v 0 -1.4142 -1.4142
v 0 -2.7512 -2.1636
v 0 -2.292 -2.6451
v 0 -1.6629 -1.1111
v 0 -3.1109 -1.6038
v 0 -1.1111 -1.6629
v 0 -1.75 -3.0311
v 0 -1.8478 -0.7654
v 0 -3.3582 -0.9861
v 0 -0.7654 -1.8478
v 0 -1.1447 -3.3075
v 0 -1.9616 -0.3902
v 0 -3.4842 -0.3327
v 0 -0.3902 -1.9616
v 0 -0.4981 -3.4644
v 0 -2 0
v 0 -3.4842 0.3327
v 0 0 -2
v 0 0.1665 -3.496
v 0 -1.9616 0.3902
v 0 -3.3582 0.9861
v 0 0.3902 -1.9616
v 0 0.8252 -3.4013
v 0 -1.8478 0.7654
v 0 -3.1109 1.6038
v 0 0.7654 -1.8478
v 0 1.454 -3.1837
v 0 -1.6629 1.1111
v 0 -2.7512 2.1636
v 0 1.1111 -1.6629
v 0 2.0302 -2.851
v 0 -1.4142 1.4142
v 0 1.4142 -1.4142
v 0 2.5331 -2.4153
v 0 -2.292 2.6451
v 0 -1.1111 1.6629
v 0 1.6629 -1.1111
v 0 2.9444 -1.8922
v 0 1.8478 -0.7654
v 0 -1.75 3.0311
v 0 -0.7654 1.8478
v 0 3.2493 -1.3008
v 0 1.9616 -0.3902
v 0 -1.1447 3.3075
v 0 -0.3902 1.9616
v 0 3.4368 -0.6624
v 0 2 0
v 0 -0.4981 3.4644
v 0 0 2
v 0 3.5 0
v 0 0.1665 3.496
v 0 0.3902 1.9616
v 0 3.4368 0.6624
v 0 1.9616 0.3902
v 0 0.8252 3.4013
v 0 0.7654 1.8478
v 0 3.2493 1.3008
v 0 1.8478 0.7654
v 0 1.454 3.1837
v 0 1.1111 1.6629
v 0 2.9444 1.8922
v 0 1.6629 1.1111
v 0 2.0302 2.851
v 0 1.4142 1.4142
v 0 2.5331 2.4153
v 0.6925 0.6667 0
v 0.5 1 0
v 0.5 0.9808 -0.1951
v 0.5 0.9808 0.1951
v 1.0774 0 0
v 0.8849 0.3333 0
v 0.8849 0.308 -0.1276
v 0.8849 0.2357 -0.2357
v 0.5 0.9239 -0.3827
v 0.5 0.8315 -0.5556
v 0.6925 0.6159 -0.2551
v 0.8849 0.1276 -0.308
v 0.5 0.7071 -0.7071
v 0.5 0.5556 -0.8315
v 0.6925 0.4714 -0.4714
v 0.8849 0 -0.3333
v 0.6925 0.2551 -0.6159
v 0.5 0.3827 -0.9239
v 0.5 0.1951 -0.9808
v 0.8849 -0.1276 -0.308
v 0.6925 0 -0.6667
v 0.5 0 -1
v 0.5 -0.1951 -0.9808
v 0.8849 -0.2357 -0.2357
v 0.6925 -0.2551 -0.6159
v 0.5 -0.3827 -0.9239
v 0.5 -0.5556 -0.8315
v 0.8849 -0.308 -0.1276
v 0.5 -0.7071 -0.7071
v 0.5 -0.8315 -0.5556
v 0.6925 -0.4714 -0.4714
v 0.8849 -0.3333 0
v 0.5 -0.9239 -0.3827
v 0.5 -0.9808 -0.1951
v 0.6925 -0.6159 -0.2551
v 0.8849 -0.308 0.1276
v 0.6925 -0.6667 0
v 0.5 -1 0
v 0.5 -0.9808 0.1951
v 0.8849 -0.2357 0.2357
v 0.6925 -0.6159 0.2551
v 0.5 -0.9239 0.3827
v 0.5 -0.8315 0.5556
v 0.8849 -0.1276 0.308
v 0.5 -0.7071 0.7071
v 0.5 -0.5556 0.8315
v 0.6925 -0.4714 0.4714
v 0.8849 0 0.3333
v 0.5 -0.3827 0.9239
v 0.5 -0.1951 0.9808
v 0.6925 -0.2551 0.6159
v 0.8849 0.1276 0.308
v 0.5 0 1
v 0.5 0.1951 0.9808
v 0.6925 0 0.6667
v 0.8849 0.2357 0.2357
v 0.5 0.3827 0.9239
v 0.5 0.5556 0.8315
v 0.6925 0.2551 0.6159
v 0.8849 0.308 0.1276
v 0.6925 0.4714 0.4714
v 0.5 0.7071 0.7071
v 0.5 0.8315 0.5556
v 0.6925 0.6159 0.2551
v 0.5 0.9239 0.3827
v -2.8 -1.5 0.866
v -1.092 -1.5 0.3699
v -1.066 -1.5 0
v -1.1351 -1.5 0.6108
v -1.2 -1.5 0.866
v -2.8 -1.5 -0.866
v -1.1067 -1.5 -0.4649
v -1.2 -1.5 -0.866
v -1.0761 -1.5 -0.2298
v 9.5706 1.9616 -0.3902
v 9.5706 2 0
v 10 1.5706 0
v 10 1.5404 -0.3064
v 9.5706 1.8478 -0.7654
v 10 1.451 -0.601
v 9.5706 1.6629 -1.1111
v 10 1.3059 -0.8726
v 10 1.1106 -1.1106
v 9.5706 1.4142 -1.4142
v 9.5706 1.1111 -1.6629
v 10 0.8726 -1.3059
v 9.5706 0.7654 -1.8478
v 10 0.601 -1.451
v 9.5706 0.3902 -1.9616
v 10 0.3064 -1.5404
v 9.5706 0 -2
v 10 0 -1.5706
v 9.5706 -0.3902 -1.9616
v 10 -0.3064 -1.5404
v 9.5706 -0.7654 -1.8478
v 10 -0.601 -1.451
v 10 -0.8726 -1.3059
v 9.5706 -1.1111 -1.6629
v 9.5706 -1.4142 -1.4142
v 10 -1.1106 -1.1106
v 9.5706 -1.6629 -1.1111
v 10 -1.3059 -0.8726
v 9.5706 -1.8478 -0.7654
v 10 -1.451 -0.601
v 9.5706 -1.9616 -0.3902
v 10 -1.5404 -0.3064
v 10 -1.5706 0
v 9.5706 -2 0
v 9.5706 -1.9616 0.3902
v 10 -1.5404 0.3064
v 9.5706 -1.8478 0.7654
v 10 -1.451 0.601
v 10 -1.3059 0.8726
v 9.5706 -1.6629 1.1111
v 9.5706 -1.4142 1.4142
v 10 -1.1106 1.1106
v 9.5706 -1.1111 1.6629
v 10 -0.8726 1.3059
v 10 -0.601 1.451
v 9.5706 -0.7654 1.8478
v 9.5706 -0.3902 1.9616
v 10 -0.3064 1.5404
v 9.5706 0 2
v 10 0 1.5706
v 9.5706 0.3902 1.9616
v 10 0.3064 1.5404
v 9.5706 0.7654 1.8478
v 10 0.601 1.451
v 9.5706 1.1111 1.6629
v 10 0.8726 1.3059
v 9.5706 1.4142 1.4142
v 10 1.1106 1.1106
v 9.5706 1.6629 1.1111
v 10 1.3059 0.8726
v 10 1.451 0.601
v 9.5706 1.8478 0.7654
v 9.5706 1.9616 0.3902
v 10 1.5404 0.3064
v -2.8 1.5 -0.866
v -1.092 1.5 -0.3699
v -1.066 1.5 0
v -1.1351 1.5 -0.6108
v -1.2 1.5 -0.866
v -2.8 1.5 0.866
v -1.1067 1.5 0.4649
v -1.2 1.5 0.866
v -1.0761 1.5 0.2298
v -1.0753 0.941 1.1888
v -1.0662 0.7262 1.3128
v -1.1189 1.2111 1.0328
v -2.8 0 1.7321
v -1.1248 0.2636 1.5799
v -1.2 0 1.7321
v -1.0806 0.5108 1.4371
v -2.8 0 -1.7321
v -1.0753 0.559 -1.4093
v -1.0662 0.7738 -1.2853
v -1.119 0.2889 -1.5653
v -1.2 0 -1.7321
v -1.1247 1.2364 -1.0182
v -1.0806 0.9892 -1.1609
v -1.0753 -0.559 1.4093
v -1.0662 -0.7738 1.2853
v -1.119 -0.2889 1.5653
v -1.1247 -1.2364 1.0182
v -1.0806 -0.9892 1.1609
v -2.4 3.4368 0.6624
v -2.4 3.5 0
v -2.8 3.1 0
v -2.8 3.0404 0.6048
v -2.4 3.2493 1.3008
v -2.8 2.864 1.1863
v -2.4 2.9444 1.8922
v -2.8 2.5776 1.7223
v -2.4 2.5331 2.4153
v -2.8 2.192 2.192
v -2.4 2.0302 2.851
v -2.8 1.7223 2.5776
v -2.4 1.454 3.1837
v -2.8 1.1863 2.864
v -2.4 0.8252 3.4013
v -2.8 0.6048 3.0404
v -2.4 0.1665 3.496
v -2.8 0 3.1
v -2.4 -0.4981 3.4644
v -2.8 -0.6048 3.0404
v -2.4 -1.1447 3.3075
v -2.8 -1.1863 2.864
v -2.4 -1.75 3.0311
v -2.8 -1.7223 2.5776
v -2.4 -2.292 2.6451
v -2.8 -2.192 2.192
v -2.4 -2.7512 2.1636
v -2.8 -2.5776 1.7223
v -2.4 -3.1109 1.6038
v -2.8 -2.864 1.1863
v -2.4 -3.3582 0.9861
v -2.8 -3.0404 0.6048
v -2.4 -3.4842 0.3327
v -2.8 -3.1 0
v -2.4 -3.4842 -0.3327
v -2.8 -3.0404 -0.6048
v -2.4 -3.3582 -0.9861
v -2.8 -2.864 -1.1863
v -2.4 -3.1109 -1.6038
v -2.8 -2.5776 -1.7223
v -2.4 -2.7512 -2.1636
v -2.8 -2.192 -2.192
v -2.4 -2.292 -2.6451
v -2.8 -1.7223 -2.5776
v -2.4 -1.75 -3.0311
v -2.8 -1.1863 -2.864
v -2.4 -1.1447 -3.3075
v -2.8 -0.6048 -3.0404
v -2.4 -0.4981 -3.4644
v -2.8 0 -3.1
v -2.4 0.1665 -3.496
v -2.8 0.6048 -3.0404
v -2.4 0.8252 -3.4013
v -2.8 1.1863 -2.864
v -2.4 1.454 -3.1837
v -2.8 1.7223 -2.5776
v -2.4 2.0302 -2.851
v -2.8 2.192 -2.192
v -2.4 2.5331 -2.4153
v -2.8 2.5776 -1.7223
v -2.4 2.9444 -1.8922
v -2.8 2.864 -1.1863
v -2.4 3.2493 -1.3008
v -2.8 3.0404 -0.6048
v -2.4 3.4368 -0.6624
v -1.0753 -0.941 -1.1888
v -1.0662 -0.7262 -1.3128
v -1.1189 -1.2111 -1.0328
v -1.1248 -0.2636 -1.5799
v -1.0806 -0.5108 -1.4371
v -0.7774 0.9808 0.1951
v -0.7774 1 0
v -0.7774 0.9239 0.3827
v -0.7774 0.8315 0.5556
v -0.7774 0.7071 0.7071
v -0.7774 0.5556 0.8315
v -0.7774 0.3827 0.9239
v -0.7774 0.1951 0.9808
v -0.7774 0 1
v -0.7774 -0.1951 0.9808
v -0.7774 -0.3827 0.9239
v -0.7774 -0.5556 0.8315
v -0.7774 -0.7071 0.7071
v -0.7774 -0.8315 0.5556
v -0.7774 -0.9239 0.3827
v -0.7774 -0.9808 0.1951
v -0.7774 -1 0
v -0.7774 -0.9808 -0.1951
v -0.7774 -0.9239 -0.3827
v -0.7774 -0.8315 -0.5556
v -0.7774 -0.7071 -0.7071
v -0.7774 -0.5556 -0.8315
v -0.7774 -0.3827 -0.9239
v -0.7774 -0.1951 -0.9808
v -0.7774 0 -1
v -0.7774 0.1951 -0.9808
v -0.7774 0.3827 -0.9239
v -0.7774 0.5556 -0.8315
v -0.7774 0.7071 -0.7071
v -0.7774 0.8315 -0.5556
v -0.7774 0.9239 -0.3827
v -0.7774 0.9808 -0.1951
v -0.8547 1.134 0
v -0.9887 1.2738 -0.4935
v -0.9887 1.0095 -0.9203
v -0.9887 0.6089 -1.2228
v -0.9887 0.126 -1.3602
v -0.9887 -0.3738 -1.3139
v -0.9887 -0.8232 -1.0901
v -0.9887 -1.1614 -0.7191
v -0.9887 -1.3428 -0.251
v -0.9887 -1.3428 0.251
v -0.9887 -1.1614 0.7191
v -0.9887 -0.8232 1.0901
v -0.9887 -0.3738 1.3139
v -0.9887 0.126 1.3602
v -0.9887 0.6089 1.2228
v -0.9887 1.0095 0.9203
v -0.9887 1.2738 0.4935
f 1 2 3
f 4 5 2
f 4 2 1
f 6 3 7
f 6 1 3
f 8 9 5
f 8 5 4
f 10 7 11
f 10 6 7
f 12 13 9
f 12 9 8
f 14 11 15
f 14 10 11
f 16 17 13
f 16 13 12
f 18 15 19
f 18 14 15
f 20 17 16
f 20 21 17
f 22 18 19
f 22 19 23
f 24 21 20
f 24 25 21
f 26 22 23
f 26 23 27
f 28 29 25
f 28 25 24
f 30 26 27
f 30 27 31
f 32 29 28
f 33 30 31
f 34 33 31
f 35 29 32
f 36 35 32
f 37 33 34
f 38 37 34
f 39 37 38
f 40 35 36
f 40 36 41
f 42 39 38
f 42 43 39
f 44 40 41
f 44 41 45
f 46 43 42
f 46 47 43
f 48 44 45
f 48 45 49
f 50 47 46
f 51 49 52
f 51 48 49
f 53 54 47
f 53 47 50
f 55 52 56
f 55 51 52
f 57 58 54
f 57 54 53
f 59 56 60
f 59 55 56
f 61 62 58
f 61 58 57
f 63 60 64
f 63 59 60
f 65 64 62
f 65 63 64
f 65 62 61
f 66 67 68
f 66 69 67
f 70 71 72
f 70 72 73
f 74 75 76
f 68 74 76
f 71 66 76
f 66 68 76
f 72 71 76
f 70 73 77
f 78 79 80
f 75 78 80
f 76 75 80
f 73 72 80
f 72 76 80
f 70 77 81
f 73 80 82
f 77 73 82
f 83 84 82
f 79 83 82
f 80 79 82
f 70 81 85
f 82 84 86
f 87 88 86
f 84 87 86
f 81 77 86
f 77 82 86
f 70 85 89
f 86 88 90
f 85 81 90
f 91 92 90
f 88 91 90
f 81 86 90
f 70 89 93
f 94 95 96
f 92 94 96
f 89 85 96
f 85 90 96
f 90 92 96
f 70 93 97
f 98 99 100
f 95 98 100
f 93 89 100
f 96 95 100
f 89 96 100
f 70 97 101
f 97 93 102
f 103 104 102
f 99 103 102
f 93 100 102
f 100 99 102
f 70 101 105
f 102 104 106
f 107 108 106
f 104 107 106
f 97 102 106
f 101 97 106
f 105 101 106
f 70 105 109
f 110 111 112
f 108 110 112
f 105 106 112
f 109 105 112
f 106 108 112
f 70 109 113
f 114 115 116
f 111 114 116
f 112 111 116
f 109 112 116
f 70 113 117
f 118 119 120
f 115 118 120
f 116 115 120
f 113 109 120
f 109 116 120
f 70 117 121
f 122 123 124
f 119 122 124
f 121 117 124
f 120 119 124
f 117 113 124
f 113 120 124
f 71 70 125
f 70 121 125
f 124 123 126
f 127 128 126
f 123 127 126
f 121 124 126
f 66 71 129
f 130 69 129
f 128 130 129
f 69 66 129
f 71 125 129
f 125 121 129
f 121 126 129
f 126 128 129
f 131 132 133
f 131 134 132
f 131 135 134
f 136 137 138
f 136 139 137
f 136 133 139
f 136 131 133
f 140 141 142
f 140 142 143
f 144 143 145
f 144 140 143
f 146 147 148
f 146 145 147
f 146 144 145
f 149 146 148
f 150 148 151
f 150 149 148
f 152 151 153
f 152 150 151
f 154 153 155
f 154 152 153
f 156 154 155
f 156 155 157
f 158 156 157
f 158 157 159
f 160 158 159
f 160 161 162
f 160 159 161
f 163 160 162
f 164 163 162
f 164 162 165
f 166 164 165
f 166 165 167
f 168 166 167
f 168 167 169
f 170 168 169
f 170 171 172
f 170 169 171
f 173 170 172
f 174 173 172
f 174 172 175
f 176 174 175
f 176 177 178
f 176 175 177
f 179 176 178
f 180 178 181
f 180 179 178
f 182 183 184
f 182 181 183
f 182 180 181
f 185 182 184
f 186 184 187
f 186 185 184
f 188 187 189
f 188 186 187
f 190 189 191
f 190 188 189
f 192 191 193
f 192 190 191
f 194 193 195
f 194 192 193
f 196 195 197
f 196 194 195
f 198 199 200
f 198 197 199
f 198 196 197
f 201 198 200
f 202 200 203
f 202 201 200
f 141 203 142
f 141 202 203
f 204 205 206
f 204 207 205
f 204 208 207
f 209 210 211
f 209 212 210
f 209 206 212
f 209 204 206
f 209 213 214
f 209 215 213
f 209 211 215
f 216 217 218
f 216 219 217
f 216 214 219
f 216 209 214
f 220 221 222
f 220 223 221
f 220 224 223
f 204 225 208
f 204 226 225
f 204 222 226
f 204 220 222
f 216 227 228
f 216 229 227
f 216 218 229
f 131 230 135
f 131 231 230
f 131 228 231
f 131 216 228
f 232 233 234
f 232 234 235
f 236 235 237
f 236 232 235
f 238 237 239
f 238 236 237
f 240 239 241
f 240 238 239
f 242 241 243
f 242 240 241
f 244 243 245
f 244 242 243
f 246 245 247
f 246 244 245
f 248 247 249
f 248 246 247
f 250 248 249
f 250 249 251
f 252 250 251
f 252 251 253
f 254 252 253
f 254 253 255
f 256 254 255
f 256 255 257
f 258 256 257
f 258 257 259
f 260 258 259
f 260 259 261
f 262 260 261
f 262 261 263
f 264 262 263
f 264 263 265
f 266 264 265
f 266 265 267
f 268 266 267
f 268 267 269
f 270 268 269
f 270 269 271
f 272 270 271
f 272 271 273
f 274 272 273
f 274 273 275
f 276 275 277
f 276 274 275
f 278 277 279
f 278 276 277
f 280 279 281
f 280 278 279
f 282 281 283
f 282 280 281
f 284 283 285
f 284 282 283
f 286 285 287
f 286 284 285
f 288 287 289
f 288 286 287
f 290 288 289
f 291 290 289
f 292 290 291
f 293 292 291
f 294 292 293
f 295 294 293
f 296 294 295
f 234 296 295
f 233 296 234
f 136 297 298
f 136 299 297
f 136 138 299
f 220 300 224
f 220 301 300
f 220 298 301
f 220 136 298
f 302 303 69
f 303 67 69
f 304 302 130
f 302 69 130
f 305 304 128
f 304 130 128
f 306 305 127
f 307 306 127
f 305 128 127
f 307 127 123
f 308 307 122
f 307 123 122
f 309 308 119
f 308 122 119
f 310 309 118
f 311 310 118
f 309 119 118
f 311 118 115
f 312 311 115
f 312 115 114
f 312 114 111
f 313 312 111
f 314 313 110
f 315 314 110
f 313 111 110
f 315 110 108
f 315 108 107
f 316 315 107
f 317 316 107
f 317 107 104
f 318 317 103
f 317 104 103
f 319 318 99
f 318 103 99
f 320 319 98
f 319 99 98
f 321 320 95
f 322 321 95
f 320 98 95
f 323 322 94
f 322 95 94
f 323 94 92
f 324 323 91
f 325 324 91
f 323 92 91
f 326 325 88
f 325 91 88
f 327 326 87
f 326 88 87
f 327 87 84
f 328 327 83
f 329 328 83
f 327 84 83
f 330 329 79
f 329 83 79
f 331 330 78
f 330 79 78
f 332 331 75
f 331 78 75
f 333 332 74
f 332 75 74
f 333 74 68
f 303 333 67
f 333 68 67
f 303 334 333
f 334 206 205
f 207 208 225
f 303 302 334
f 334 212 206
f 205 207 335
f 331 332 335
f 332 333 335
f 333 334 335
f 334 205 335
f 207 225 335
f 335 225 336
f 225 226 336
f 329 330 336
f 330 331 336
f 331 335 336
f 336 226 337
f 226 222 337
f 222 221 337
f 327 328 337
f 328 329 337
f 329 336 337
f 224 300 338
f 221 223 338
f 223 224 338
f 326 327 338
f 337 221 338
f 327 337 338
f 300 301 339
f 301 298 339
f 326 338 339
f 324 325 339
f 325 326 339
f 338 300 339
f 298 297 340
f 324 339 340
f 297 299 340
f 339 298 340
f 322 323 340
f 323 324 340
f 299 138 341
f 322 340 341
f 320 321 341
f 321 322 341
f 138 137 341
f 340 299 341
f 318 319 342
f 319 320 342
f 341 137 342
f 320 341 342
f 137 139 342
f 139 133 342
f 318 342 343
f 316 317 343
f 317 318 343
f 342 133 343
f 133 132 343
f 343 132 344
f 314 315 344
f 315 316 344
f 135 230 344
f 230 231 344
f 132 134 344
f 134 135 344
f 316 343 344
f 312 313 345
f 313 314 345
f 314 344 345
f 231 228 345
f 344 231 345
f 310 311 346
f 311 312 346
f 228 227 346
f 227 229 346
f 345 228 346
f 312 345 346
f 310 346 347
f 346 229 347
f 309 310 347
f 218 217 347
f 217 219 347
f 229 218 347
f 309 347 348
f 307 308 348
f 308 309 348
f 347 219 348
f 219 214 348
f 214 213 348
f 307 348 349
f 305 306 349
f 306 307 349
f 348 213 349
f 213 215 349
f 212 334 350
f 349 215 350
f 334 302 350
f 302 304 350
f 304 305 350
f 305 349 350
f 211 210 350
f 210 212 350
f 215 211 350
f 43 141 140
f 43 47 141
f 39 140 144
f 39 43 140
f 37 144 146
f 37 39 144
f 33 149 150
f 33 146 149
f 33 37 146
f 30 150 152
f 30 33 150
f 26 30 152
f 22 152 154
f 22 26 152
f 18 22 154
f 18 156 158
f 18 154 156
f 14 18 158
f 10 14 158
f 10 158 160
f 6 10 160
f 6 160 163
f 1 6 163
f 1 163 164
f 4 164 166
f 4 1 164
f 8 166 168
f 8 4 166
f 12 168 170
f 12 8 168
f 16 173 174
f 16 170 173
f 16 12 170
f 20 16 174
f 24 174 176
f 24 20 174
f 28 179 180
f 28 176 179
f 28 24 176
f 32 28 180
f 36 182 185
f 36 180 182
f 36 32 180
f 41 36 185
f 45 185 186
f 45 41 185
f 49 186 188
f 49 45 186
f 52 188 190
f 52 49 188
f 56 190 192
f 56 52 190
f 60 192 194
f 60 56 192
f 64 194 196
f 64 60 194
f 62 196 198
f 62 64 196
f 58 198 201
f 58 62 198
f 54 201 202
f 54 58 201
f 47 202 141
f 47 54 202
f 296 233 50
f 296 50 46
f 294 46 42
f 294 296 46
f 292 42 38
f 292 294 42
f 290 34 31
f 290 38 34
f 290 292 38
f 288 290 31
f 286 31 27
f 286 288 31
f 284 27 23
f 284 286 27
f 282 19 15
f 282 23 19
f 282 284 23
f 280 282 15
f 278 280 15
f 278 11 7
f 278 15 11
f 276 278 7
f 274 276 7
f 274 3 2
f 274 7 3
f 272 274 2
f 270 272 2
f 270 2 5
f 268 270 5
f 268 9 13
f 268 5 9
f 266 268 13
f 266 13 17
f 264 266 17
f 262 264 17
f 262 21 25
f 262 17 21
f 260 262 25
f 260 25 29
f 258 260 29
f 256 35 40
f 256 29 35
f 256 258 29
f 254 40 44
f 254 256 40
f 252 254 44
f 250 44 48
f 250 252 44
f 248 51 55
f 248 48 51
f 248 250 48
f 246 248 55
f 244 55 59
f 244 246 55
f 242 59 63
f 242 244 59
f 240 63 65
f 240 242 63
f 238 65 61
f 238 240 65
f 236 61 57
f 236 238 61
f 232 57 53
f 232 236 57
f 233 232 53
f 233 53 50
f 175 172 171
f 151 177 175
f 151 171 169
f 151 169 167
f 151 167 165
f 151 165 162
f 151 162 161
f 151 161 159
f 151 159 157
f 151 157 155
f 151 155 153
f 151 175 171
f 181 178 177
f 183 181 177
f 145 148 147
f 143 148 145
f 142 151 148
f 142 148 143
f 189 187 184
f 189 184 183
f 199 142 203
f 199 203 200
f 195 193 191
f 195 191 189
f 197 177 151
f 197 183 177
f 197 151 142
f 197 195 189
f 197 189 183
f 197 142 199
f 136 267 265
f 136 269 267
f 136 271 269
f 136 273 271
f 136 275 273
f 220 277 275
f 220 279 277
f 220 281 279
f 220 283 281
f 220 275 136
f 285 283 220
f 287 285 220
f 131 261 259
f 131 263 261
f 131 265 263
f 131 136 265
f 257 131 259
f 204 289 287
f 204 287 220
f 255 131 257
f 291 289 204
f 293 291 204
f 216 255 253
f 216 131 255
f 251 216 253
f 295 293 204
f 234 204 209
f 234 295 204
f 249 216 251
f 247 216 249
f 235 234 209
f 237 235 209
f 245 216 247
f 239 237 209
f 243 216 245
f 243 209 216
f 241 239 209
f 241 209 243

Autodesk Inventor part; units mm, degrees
ref_plane "YZ Plane" through (0, 0, 0) normal (1, 0, 0) x (0, 1, 0)
ref_plane "XZ Plane" through (0, 0, 0) normal (0, 1, 0) x (-1, 0, 0)
sketch "Szkic1" plane through (0, 0, 0) normal (0, 0, 1) x (1, 0, 0)
  line L0 (1.0774, 0) -> (10, 0)
  line L1 (10, 0) -> (10, 2)
  line L2 (10, 2) -> (0, 2)
  line L3 (0, 2) -> (0, 3.5)
  line L4 (0, 3.5) -> (-2.8, 3.5)
  line L5 (-2.8, 3.5) -> (-2.8, 1.7321)
  line L6 (-2.8, 1.7321) -> (-1.2, 1.7321)
  line L7 (-1.2, 1.7321) -> (-0.7774, 1)
  line L8 (-5.36, 0) -> (12.56, 0) projected
  line L9 (0, -0.7) -> (0, 4.2) projected
  line L10 (-0.7774, 1) -> (0.5, 1)
  line L11 (0.5, 1) -> (1.0774, 0)
  line L12 (-2.8, 1.7321) -> (-2.8, 0) construction
  line L13 (-2.8, 3.1) -> (-2.4, 3.5)
  dimension "d0" = 2.8
  dimension "d1" = 1.6
  dimension "d2" = 60
  dimension "d3" = 4
  dimension "d4" = 3.4641
  dimension "d5" = 7
  dimension "d15" = 3.3
  dimension "d16" = 2
  dimension "d17" = 10
  dimension "d32" = 45
  dimension "d33" = 0.4
revolve "Bryła" add sketch "Szkic1" angle 360 about axis through (1.0774, 0, 0) along (1, 0, 0) contours L11 L10 L9 L2 L1 L0 | L10 L7 L6 L5 L13 L4 L3 L9 | L13 L5 L4
revolve "Faza2" cut sketch "Szkic1" angle 360 about axis through (-10, 0, 0) along (1, 0, 0) contours L13 L5 L4
sketch "Szkic2" plane through (-2.8, 0, 0) normal (-1, 0, 0) x (0, 0, 1)
  circle A0 centre (0, 0) radius 1.7321 projected
  line L0 (0, -4.9) -> (0, 4.9) projected
  line L1 (-4.9, 0) -> (4.9, 0) projected
  line L2 (1.7321, 0) -> (0.866, -1.5)
  line L3 (0.866, -1.5) -> (-0.866, -1.5)
  line L4 (-0.866, -1.5) -> (-1.7321, 0)
  line L5 (-1.7321, 0) -> (-0.866, 1.5)
  line L6 (-0.866, 1.5) -> (0.866, 1.5)
  line L7 (0.866, 1.5) -> (1.7321, 0)
extrude "Szczelina" add sketch "Szkic2" against normal up to next contours L7 A0 | A0 L2 | L6 L0 A0 | A0 L0 L3 | L0 L6 A0 | A0 L3 L0 | L4 A0 | A0 L5
thread "Gwint" size "M4x0.7" class "6g" standard "ISO Metric profile" length 6.5
chamfer "Faza1" distance 0.4294 distance2 0.4294 1 edges at (10, -2, 0) measured on face at (10, 0.556, 0.0273)
ref_plane "Work Plane1" through (5, 0, 0) normal (0, 0.5, 0.866) x (1, 0, 0)
equation "\"d0\" = KOH"
equation "\"d1\" = INTI"
equation "\"d3\" = GD"
equation "\"d4\" = 1.1547 * SW"
equation "\"d5\" = KOD"
equation "\"d15\" = INFT"
equation "\"d16\" = SDT"
equation "\"d17\" = NLG"
equation "\"d33\" = Cham"
equation "\"d7\" = GEL"
equation "\"d9\" = -0.5 * SPD + 0.5 * GD"
equation "\"d12\" = GUL"
equation "\"GD\" = NND"
equation "\"NLG\" = 10"
equation "\"GEL\" = 6.5"
equation "\"KOD\" = 7"
equation "\"KOH\" = 2.8"
equation "\"GUL\" = 0.61345 * PTC"
equation "\"SW\" = 3"
equation "\"INTI\" = 1.6"
equation "\"SPD\" = NND - 1.2269 * PTC"
equation "\"SDT\" = 2"
equation "\"INFT\" = 3.3"
equation "\"Cham\" = 0.4"
equation "\"TOA\" = 30deg"
equation "\"GD1\" = THREADDIA - 1.2269 * PTC"
equation "\"THREADDIA\" = 4"
equation "\"BDM\" = NND"
equation "\"FAWI\" = 45deg"
equation "\"RR\" = 0.1 * NND"
equation "\"PTC\" = 0.7"
equation "\"NND\" = 4"
equation "\"FAWI1\" = 45deg"
equation "\"GAL\" = 0.61345 * PTC"
equation "\"E0\" = 1.155 * SW"
properties part number "DIN 6912 - M4 x 10" material "Stal, miękka"
